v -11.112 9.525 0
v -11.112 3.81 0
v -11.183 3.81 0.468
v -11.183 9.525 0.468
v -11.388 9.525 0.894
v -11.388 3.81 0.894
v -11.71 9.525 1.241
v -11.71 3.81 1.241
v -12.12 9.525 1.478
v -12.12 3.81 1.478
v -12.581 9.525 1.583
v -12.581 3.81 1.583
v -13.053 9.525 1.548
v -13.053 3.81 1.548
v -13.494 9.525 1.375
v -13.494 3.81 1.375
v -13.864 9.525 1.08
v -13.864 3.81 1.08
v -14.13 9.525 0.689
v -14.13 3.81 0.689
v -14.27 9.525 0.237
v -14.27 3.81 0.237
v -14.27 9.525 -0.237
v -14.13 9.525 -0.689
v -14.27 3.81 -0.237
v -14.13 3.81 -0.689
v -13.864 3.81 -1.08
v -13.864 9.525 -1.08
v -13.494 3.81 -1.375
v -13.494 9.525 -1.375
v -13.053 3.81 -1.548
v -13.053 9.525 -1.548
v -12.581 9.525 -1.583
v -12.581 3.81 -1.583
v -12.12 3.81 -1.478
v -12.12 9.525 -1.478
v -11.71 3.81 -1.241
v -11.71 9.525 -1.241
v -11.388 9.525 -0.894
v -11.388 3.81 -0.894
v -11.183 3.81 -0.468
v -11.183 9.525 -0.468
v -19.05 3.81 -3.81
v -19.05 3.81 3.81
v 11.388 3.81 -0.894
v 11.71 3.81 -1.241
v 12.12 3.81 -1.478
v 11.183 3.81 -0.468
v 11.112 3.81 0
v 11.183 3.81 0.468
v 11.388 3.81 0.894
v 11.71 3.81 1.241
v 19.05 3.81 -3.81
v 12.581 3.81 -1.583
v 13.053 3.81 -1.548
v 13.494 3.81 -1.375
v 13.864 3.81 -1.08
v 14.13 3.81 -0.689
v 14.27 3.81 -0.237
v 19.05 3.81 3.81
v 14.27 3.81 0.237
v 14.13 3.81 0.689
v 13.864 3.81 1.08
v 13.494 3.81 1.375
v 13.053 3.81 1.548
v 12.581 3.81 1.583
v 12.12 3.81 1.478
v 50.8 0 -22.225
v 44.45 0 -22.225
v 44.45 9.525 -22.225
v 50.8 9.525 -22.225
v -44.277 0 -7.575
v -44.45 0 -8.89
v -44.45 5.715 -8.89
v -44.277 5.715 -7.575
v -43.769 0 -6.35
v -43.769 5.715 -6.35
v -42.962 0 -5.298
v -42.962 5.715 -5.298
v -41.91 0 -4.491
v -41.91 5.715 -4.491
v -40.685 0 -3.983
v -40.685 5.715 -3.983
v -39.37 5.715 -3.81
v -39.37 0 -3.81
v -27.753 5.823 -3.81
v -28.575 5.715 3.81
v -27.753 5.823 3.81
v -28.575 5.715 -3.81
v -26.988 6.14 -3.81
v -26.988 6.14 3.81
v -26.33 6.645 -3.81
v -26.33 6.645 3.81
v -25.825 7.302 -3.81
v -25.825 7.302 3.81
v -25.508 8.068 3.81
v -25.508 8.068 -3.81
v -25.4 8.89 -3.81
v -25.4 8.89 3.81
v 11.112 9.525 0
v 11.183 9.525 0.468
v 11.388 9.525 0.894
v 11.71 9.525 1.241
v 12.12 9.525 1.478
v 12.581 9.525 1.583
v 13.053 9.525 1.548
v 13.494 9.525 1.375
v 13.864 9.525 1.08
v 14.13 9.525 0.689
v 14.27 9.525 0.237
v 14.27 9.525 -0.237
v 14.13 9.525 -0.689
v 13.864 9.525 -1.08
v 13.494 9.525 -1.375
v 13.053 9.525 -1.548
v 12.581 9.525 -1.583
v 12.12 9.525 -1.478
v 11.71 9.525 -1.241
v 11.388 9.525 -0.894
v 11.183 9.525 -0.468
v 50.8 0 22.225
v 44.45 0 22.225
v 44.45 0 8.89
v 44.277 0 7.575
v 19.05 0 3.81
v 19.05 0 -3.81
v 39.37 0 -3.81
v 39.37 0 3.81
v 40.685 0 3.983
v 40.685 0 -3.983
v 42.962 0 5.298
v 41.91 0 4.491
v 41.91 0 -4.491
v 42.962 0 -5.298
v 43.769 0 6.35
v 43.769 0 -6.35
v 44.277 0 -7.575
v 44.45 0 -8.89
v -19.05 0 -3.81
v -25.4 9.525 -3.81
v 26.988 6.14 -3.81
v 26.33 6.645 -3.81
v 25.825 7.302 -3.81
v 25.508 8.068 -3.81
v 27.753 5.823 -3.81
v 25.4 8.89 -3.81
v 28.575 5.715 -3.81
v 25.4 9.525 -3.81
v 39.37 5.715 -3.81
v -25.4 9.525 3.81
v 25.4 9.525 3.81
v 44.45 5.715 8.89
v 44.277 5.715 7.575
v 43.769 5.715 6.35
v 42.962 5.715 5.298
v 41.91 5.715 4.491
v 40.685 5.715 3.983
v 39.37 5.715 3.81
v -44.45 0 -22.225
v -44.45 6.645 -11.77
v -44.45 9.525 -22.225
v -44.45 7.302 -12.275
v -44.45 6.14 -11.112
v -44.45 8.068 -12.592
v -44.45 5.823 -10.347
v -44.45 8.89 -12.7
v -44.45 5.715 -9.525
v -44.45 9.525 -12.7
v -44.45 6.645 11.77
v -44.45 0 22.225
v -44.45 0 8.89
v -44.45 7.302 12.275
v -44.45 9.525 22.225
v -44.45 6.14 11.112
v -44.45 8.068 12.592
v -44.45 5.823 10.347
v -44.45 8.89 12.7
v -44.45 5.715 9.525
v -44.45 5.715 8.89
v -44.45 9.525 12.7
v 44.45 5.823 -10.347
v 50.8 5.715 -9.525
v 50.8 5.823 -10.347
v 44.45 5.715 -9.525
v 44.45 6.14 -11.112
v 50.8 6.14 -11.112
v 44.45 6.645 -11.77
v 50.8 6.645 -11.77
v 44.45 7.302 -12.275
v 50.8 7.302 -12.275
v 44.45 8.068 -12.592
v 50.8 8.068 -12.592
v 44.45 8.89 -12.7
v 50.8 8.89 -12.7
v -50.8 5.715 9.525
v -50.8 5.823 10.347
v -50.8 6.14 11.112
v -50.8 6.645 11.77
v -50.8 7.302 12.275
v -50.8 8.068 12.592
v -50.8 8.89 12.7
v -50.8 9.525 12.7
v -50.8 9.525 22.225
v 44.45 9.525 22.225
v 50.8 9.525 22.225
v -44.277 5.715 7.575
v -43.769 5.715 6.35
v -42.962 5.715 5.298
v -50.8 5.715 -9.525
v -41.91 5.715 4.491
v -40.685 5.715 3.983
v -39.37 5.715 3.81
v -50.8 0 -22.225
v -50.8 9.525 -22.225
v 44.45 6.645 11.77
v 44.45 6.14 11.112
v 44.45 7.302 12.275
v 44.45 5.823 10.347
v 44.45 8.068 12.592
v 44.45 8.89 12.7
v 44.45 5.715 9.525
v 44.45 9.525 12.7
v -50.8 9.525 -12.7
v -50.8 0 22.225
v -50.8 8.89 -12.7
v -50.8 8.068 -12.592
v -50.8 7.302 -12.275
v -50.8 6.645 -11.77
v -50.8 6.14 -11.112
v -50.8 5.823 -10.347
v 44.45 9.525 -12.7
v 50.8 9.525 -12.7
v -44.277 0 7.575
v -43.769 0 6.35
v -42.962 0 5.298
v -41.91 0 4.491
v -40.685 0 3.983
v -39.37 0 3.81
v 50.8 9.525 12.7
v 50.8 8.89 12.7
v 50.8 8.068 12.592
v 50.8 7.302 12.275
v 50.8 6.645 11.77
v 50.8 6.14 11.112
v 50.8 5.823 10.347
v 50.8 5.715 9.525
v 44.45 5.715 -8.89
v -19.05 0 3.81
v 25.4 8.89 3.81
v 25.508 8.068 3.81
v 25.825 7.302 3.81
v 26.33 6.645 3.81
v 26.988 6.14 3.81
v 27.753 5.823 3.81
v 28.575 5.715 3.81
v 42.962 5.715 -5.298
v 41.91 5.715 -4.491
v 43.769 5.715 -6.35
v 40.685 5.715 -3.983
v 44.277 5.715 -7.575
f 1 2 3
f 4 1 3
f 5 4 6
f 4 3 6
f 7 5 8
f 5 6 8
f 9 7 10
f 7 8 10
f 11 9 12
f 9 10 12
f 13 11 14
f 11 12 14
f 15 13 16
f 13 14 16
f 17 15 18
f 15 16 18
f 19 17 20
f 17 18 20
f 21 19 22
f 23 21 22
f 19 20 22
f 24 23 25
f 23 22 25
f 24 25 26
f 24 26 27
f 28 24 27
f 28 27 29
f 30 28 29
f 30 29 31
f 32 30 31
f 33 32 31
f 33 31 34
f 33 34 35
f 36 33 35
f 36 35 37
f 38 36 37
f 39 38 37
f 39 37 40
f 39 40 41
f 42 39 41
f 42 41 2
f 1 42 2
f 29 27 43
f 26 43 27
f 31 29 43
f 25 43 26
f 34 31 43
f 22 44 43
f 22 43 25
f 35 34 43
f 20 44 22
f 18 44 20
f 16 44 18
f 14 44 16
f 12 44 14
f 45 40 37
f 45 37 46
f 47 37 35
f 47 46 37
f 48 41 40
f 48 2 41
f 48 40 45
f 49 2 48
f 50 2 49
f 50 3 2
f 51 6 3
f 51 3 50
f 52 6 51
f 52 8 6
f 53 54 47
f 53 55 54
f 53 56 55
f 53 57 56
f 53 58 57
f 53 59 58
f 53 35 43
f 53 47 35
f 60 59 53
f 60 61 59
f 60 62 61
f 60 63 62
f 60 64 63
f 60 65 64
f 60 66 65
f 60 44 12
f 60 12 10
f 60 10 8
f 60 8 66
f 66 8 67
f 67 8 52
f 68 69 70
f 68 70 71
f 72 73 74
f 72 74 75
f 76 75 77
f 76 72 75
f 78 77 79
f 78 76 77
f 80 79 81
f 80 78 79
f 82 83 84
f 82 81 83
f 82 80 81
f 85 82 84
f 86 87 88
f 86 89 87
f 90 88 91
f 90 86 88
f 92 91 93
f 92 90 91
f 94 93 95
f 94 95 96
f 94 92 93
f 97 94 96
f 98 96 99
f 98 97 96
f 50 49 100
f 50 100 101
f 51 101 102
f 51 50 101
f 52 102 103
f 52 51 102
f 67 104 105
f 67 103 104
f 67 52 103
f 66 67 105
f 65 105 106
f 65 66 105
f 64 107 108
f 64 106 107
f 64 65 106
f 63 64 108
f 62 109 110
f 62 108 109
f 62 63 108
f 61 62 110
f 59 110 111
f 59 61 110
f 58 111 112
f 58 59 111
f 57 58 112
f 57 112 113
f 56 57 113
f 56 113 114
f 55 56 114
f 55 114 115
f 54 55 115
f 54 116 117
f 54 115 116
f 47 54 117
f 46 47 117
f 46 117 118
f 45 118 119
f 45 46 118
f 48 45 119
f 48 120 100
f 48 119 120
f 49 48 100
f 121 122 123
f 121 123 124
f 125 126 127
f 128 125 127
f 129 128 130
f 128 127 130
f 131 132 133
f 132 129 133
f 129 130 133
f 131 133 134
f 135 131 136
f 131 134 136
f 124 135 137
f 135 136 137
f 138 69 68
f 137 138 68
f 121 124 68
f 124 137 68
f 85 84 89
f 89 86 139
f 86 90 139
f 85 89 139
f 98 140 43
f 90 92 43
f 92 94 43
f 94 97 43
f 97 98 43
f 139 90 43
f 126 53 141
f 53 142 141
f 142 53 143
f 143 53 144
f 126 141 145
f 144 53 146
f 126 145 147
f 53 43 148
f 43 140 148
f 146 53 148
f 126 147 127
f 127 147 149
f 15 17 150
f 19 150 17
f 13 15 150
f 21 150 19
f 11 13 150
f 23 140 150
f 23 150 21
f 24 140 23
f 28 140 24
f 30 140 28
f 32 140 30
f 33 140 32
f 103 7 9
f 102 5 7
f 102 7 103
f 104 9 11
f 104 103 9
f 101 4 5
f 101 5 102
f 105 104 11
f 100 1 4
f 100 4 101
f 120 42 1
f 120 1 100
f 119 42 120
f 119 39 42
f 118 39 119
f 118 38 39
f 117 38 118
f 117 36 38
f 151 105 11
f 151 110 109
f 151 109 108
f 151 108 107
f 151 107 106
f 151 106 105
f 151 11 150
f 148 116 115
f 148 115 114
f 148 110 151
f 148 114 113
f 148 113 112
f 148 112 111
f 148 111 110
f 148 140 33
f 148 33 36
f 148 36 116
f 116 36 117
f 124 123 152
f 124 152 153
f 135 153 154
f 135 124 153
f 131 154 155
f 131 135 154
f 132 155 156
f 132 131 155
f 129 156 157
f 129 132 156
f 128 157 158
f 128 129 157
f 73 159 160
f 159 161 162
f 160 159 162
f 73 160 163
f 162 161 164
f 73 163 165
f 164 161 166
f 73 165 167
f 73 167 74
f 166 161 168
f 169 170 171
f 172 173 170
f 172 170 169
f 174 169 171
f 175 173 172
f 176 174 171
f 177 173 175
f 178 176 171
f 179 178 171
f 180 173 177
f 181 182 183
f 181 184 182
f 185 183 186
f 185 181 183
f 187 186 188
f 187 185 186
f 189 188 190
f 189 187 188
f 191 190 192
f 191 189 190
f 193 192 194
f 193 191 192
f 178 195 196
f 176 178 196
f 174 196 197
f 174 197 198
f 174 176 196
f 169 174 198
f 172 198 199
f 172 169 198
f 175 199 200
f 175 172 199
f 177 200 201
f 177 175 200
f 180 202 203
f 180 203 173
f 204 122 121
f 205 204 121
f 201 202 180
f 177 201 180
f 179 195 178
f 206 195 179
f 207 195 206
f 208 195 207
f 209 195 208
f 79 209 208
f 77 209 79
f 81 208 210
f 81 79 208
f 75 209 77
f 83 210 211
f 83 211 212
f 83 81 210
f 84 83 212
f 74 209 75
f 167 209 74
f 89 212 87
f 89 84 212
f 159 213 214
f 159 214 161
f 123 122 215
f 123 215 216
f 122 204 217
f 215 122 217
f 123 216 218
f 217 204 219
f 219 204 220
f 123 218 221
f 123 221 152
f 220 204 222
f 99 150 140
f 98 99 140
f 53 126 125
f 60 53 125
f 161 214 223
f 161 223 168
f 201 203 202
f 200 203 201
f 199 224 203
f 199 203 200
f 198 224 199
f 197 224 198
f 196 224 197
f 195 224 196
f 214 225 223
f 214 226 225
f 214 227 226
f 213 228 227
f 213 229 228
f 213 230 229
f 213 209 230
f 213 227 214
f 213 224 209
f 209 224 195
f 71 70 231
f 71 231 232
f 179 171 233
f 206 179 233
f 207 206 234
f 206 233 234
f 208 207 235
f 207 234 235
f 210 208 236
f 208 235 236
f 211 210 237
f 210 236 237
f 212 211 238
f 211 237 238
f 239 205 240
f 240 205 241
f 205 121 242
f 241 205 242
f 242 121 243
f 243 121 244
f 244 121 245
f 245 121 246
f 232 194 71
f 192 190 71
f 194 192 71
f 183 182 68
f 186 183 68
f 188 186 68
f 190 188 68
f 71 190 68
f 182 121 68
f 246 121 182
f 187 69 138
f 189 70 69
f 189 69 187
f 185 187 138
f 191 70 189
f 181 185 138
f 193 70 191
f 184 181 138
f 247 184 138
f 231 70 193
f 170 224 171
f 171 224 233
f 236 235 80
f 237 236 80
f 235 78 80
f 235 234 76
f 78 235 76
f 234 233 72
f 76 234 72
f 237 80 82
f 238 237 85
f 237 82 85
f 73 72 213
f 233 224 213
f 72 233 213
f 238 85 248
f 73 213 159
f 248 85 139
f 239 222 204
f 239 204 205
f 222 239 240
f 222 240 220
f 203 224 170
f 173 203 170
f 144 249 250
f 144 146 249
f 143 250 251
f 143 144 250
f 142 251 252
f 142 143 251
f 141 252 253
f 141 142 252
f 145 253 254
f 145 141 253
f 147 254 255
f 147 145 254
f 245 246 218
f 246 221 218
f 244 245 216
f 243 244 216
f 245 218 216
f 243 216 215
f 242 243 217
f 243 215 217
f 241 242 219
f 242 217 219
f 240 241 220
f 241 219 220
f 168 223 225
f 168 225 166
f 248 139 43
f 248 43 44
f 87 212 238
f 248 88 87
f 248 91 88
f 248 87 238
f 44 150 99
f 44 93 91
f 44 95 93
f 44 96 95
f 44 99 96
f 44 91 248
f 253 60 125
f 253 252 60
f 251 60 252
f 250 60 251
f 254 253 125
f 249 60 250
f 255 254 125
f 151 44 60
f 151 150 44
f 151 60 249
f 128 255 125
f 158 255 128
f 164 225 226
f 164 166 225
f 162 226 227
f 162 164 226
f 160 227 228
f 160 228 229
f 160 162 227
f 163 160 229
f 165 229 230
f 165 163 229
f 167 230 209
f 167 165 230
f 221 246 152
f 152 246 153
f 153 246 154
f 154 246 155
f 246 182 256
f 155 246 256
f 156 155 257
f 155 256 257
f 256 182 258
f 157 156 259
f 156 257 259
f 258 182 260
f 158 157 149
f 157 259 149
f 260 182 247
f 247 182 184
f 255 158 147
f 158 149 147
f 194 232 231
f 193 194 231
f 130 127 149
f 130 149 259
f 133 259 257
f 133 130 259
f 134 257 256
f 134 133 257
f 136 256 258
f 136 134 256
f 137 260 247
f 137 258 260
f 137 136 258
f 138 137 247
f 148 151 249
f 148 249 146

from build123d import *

# Parameters (mm, degrees)
SKETCH1_W           = 101.6
SKETCH1_H           = 44.45
BOSS_EXTRUDE1_DEPTH = 9.525
SKETCH2_W           = 88.9
SKETCH2_H           = 18.415
CUT_EXTRUDE1_DEPTH  = 10.525
FILLET1_R           = 5.08
SKETCH3_W           = 25.4
SKETCH3_H           = 25.4
CUT_EXTRUDE2_DEPTH  = 3.81
FILLET2_R           = 3.175
SKETCH4_R           = 1.5875
CUT_EXTRUDE3_DEPTH  = 10.525
SKETCH5_W           = 38.1
SKETCH5_H           = 7.62
CUT_EXTRUDE4_DEPTH  = 3.81


with BuildPart() as part:
    # Sketch1 → Boss-Extrude1 (new body)
    with BuildSketch(Plane(origin=(0, 0, 0), x_dir=(1, 0, 0), z_dir=(0, 1, 0))):
        Rectangle(SKETCH1_W, SKETCH1_H)
    extrude(amount=BOSS_EXTRUDE1_DEPTH)

    # Sketch2 → Cut-Extrude1 (cut, through all)
    with BuildSketch(Plane(origin=(0, 9.525, 0), x_dir=(1, 0, 0), z_dir=(0, 1, 0))):
        with Locations((0, -13.0175)):
            Rectangle(SKETCH2_W, SKETCH2_H)
    cut_extrude1 = extrude(amount=-CUT_EXTRUDE1_DEPTH, mode=Mode.SUBTRACT)

    # Mirror1: Cut-Extrude1 across plane
    add(cut_extrude1.mirror(Plane.XY), mode=Mode.SUBTRACT)

    # Fillet1
    fillet1_edges = [part.edges().sort_by_distance(p)[0] for p in [
        (-44.45, 4.7625, 3.81),
        (44.45, 4.7625, 3.81),
        (-44.45, 4.7625, -3.81),
        (44.45, 4.7625, -3.81),
    ]]
    fillet(fillet1_edges, radius=FILLET1_R)

    # Sketch3 → Cut-Extrude2 (cut)
    with BuildSketch(Plane(origin=(0, 9.525, 0), x_dir=(1, 0, 0), z_dir=(0, 1, 0))):
        with Locations((-38.1, 0)):
            Rectangle(SKETCH3_W, SKETCH3_H)
    cut_extrude2 = extrude(amount=-CUT_EXTRUDE2_DEPTH, mode=Mode.SUBTRACT)

    # Mirror2: Cut-Extrude2 across plane
    add(cut_extrude2.mirror(Plane(origin=(0, 0, 0), x_dir=(0, 0, 1), z_dir=(1, 0, 0))), mode=Mode.SUBTRACT)

    # Fillet2
    fillet2_edges = [part.edges().sort_by_distance(p)[0] for p in [
        (47.625, 5.715, -12.7),
        (47.625, 5.715, 12.7),
        (25.4, 5.715, 0),
        (-47.625, 5.715, 12.7),
        (-25.4, 5.715, 0),
        (-47.625, 5.715, -12.7),
    ]]
    fillet(fillet2_edges, radius=FILLET2_R)

    # Sketch4 → Cut-Extrude3 (cut, through all)
    with BuildSketch(Plane.XZ):
        with Locations((-12.7, 0)):
            Circle(SKETCH4_R)
    cut_extrude3 = extrude(amount=-CUT_EXTRUDE3_DEPTH, mode=Mode.SUBTRACT)

    # Sketch5 → Cut-Extrude4 (cut)
    with BuildSketch(Plane.XZ):
        Rectangle(SKETCH5_W, SKETCH5_H)
    extrude(amount=-CUT_EXTRUDE4_DEPTH, mode=Mode.SUBTRACT)

    # Mirror3: Cut-Extrude3 across plane
    add(cut_extrude3.mirror(Plane(origin=(0, 0, 0), x_dir=(0, 0, 1), z_dir=(1, 0, 0))), mode=Mode.SUBTRACT)


solid = part.part
